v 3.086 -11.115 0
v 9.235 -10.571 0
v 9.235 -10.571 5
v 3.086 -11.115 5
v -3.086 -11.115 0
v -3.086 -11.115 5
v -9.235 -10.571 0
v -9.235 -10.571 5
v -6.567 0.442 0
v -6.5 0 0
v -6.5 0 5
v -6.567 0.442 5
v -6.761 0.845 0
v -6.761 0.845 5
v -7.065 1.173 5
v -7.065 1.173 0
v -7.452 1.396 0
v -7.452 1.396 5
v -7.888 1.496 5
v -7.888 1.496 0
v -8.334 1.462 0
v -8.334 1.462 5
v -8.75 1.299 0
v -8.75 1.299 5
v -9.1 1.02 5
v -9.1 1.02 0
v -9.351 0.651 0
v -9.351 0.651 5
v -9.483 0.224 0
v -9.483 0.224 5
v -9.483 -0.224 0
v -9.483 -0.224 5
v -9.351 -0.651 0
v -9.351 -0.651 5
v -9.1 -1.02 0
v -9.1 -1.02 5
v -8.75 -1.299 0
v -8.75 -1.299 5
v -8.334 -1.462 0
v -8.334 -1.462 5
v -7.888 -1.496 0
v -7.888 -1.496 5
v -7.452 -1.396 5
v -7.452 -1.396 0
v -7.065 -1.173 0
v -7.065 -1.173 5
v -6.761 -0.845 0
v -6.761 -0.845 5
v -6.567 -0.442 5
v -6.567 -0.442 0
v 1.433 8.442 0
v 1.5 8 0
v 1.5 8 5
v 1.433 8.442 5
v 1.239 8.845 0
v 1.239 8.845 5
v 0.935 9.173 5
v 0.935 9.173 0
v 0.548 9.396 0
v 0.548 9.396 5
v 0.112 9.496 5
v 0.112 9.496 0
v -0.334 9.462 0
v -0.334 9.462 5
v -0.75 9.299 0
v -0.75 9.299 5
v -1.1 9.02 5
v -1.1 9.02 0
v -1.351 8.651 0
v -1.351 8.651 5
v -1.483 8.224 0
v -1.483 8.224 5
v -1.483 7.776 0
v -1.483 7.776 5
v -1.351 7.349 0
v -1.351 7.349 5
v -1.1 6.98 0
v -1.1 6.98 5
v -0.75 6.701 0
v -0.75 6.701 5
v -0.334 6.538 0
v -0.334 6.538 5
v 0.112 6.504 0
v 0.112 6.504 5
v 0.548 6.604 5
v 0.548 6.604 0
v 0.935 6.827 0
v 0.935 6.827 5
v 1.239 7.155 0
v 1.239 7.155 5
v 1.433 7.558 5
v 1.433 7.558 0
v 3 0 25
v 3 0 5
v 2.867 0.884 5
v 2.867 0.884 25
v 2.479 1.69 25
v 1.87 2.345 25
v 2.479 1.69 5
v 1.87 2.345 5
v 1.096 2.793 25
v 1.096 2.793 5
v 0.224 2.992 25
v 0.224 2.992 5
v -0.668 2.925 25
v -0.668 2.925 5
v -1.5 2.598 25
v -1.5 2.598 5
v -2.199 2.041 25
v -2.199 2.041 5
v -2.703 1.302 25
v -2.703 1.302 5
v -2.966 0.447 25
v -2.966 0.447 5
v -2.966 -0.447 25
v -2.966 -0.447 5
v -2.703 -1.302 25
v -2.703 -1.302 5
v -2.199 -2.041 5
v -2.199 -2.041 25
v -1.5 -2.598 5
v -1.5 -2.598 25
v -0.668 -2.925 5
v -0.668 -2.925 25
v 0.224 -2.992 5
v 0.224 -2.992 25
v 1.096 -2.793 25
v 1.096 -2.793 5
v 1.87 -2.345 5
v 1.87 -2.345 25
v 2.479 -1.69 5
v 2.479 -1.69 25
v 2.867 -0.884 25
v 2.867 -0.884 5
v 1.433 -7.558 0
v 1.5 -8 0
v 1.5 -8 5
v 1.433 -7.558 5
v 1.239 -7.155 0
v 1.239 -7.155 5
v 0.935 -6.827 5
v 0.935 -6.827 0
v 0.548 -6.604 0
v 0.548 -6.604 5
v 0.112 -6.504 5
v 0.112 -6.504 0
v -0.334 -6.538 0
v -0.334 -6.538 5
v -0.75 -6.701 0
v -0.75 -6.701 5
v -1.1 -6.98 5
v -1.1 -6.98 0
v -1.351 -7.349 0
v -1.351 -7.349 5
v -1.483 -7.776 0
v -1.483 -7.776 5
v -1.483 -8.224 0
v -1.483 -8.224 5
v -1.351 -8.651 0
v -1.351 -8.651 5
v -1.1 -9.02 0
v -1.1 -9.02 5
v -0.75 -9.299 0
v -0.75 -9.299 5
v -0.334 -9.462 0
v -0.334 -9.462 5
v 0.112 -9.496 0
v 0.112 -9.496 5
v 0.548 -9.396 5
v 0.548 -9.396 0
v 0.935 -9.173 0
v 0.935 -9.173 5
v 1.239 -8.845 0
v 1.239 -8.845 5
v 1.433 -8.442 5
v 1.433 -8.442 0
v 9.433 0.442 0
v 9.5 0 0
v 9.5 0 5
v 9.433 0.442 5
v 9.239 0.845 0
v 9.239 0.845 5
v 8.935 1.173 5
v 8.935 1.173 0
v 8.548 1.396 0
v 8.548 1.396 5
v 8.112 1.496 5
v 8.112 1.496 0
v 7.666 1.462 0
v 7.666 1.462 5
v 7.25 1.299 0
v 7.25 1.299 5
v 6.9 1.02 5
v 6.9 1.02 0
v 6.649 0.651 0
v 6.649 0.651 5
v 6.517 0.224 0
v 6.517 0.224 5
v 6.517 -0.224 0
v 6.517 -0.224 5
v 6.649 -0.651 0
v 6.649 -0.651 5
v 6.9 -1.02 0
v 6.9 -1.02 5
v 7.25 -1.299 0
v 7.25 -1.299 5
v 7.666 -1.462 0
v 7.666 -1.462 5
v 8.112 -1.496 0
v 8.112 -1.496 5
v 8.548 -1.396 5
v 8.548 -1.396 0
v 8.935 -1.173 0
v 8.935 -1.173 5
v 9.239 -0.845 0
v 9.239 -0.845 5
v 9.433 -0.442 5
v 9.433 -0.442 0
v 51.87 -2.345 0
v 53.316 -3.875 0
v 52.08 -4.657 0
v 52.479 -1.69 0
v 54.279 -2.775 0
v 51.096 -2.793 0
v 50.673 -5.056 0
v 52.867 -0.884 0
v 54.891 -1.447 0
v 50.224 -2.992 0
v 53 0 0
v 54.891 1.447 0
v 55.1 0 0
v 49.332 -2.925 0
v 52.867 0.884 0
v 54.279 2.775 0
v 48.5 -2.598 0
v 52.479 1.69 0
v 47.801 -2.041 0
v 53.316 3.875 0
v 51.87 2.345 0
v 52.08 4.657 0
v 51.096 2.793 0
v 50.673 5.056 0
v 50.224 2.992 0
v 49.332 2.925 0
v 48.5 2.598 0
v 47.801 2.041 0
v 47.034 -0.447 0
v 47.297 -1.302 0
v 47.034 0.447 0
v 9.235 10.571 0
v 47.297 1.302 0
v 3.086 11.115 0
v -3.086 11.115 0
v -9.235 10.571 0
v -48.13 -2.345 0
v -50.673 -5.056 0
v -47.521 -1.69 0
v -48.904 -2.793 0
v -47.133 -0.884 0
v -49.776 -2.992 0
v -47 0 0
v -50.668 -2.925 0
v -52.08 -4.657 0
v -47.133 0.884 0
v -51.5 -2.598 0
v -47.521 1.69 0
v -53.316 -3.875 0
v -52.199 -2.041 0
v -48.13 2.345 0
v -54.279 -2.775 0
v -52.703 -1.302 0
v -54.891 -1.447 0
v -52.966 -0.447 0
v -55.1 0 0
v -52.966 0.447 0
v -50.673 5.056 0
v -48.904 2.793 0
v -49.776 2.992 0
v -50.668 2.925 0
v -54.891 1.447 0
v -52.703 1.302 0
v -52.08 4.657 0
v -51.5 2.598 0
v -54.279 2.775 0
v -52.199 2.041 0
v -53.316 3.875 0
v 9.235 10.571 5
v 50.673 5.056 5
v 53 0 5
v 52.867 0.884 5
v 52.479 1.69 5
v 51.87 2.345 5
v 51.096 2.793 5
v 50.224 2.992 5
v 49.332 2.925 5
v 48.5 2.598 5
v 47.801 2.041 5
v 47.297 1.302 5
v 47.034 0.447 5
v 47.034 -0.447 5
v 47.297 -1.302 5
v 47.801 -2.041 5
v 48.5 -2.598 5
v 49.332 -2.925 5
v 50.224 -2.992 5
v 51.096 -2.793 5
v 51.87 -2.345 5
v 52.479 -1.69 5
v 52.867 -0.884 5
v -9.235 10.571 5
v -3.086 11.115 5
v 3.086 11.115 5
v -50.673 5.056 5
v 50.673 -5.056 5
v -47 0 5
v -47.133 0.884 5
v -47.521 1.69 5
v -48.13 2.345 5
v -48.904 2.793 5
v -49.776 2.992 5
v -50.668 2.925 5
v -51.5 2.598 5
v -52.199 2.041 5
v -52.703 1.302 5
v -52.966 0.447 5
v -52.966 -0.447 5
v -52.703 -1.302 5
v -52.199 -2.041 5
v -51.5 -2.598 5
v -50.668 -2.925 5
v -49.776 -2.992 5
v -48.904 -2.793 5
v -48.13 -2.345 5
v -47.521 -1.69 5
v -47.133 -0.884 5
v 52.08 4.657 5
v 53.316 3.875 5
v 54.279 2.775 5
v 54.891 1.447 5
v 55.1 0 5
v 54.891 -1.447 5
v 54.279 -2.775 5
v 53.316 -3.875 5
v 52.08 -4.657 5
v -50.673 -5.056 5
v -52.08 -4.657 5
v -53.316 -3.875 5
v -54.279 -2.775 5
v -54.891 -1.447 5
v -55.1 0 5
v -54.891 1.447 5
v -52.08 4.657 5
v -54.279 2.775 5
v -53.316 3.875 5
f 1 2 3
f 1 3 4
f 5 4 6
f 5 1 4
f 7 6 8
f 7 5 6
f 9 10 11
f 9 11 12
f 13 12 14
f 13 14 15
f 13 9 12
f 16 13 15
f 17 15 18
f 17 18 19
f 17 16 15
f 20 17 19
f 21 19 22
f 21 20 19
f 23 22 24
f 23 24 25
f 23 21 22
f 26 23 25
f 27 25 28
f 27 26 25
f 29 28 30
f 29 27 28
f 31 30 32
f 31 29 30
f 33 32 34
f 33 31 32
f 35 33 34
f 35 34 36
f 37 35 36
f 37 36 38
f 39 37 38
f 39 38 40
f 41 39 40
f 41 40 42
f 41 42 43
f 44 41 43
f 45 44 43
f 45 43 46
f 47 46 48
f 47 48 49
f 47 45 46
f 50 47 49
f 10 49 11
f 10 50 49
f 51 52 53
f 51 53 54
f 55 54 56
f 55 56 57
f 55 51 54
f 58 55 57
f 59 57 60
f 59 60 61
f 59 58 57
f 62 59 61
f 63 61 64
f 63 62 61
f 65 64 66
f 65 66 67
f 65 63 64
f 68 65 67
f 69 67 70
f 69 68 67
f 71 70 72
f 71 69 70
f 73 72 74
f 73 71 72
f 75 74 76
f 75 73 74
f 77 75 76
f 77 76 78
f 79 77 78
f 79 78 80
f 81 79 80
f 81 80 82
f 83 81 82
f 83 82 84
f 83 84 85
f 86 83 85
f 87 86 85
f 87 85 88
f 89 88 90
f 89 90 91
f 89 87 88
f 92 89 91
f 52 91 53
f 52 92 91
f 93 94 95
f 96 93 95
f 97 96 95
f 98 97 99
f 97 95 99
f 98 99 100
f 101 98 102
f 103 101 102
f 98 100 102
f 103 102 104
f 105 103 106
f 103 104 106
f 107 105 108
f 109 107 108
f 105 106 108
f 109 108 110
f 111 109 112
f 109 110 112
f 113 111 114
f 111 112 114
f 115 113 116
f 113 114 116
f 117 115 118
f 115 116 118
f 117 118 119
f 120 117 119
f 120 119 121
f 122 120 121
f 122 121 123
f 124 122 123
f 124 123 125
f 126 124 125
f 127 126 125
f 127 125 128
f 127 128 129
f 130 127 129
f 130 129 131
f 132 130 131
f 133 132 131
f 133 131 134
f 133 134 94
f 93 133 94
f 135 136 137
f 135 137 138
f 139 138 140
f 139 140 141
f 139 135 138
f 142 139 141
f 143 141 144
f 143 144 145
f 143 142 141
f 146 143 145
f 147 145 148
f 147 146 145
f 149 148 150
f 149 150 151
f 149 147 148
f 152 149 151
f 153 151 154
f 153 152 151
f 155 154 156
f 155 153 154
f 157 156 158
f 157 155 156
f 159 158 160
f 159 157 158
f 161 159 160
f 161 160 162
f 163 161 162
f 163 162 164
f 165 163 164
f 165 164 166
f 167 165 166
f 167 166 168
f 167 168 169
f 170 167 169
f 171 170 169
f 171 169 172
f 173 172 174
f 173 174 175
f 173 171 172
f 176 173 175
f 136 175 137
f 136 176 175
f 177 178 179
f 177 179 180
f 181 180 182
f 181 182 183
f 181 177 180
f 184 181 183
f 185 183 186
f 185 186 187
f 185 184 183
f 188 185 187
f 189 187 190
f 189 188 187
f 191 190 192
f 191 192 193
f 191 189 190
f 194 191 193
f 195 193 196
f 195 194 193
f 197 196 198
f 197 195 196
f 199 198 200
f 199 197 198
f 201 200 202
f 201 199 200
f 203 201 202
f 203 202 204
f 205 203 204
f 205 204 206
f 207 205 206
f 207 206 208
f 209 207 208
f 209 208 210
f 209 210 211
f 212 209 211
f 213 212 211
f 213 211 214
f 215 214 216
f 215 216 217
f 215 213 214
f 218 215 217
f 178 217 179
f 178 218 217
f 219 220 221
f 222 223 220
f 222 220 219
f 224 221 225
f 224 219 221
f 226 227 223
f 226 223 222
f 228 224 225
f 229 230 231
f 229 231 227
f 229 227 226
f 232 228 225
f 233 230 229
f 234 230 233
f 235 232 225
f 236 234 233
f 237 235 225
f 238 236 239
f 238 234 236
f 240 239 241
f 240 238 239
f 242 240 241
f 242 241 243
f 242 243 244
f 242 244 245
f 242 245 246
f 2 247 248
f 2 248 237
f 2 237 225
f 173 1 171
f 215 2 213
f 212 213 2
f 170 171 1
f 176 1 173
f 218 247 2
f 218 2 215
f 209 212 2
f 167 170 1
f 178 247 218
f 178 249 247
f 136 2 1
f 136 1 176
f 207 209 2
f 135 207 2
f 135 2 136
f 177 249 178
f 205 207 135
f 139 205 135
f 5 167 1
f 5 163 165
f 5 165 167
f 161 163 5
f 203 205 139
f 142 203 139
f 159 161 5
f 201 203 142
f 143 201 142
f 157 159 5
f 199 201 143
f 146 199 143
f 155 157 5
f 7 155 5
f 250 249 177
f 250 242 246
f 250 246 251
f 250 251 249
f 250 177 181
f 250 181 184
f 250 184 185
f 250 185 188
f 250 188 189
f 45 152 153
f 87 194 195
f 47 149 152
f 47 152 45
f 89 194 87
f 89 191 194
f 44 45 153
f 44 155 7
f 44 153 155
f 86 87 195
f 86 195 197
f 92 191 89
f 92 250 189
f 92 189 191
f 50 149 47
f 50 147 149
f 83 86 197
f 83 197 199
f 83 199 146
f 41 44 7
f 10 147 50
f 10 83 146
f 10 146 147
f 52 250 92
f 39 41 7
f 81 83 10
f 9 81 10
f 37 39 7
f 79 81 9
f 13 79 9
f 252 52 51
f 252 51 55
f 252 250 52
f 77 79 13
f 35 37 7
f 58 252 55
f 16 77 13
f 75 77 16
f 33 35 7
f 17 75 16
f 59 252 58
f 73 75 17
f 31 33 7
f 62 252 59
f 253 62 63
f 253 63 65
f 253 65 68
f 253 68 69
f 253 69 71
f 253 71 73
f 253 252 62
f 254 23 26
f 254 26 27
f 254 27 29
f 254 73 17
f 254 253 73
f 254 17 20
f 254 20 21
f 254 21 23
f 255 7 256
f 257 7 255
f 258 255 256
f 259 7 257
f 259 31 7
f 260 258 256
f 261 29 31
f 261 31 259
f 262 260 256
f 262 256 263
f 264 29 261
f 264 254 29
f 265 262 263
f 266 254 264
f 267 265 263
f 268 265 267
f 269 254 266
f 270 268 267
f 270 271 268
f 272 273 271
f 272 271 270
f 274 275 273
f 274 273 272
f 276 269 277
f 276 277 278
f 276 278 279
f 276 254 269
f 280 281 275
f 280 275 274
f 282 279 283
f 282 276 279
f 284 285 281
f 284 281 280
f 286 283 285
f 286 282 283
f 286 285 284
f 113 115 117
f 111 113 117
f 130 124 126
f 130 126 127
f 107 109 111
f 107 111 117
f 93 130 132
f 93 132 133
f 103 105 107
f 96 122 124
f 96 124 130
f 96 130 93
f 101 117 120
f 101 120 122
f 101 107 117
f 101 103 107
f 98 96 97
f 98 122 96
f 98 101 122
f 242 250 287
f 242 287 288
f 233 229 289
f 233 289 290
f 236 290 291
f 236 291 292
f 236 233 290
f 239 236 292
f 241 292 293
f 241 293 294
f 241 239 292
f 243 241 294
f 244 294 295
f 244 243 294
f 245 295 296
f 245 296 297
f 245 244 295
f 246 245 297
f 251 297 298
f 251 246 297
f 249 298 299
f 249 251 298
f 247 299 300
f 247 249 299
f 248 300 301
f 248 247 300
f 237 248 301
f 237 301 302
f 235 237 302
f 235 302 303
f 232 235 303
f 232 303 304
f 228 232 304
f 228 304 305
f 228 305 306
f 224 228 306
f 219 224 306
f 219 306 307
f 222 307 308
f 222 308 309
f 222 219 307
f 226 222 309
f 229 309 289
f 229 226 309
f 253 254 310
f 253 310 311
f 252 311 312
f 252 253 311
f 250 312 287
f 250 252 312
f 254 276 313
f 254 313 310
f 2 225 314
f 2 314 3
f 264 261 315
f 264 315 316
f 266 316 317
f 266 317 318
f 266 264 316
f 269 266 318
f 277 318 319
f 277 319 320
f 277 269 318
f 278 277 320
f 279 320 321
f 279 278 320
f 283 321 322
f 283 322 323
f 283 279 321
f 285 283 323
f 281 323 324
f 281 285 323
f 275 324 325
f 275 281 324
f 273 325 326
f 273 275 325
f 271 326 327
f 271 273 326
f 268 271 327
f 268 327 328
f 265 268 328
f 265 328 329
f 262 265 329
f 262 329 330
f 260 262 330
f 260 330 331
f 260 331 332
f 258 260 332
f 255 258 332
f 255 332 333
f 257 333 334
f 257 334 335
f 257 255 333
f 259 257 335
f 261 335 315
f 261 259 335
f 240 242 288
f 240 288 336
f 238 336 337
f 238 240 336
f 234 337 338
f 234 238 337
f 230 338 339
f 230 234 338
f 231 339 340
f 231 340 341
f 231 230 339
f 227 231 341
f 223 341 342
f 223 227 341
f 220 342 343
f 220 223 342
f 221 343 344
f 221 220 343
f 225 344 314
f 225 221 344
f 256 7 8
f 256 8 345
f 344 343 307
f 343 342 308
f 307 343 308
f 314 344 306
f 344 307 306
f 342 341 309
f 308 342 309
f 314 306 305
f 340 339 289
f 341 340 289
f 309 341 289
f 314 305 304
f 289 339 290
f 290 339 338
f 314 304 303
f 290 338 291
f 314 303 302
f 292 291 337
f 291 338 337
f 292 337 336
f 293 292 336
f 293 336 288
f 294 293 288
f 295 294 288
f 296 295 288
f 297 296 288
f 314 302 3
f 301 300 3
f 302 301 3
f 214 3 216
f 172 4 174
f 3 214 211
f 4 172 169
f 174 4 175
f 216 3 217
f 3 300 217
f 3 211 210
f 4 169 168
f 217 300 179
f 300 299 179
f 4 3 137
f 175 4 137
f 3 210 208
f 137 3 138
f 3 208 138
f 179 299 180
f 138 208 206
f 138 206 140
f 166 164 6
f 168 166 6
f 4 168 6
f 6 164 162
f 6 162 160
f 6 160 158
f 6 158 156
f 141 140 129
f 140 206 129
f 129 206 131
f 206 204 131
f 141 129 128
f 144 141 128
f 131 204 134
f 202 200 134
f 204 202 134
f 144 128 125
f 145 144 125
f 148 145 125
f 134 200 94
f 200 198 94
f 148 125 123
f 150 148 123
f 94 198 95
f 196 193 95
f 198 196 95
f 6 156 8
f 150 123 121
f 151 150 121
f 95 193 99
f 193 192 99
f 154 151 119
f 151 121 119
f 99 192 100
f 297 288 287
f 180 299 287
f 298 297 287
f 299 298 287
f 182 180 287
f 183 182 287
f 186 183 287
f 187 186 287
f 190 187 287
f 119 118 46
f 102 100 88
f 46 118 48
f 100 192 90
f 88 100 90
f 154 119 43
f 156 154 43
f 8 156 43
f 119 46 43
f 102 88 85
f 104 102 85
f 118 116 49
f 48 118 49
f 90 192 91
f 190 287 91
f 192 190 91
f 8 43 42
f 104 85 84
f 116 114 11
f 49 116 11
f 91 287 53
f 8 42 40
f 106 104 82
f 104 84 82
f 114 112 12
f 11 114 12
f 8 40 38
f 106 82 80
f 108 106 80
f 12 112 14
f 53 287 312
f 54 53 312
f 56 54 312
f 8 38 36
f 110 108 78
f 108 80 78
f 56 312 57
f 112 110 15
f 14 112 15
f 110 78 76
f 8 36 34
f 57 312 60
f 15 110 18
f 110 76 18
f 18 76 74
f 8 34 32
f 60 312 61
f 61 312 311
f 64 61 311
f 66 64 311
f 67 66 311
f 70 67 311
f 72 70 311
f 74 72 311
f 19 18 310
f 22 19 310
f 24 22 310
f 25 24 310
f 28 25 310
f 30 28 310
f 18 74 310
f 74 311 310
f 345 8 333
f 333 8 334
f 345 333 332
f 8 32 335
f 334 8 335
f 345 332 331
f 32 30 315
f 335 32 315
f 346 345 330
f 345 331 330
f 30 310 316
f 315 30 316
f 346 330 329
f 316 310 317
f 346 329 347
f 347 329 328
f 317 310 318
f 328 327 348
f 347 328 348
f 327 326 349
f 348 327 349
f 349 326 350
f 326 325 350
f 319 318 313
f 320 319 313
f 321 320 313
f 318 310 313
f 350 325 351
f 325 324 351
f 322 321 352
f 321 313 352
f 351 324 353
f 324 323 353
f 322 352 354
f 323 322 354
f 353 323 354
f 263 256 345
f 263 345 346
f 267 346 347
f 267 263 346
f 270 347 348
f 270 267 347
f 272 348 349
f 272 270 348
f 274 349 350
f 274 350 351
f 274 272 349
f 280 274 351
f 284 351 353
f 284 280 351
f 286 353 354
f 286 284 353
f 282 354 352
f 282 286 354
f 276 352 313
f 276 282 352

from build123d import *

# Parameters (mm, degrees)
SZKIC1_R                    = 3
SZKIC1_R_2                  = 1.5
DODANIE_WYCI_GNI_CIE1_DEPTH = 5
SZKIC1_2_R                  = 3
DODANIE_WYCI_GNI_CIE2_DEPTH = 25


with BuildPart() as part:
    # Szkic1 → Dodanie-wyci_gni_cie1 (new body)
    with BuildSketch(Plane.XY):
        with BuildLine():
            Line((-50.67287635, 5.055665151), (-9.235111676, 10.570763761))
            ThreePointArc((-9.235111676, 10.570763761), (0, 11.182632843), (9.235111676, 10.570763761))
            Line((9.235111676, 10.570763761), (50.67287635, 5.055665151))
            ThreePointArc((50.67287635, 5.055665151), (55.100246338, 0), (50.67287635, -5.055665151))
            Line((50.67287635, -5.055665151), (9.235111676, -10.570763761))
            ThreePointArc((9.235111676, -10.570763761), (0, -11.182632843), (-9.235111676, -10.570763761))
            Line((-9.235111676, -10.570763761), (-50.67287635, -5.055665151))
            ThreePointArc((-50.67287635, -5.055665151), (-55.100246338, 0), (-50.67287635, 5.055665151))
        make_face()
        Circle(SZKIC1_R, mode=Mode.SUBTRACT)
        with Locations((0, 8)):
            Circle(SZKIC1_R_2, mode=Mode.SUBTRACT)
        with Locations((-8, 0)):
            Circle(SZKIC1_R_2, mode=Mode.SUBTRACT)
        with Locations((8, 0)):
            Circle(SZKIC1_R_2, mode=Mode.SUBTRACT)
        with Locations((0, -8)):
            Circle(SZKIC1_R_2, mode=Mode.SUBTRACT)
        with Locations((-50, 0)):
            Circle(SZKIC1_R, mode=Mode.SUBTRACT)
        with Locations((50, 0)):
            Circle(SZKIC1_R, mode=Mode.SUBTRACT)
    extrude(amount=DODANIE_WYCI_GNI_CIE1_DEPTH)

    # Szkic1_2 → Dodanie-wyci_gni_cie2 (add)
    with BuildSketch(Plane.XY):
        Circle(SZKIC1_2_R)
    extrude(amount=DODANIE_WYCI_GNI_CIE2_DEPTH)


solid = part.part
